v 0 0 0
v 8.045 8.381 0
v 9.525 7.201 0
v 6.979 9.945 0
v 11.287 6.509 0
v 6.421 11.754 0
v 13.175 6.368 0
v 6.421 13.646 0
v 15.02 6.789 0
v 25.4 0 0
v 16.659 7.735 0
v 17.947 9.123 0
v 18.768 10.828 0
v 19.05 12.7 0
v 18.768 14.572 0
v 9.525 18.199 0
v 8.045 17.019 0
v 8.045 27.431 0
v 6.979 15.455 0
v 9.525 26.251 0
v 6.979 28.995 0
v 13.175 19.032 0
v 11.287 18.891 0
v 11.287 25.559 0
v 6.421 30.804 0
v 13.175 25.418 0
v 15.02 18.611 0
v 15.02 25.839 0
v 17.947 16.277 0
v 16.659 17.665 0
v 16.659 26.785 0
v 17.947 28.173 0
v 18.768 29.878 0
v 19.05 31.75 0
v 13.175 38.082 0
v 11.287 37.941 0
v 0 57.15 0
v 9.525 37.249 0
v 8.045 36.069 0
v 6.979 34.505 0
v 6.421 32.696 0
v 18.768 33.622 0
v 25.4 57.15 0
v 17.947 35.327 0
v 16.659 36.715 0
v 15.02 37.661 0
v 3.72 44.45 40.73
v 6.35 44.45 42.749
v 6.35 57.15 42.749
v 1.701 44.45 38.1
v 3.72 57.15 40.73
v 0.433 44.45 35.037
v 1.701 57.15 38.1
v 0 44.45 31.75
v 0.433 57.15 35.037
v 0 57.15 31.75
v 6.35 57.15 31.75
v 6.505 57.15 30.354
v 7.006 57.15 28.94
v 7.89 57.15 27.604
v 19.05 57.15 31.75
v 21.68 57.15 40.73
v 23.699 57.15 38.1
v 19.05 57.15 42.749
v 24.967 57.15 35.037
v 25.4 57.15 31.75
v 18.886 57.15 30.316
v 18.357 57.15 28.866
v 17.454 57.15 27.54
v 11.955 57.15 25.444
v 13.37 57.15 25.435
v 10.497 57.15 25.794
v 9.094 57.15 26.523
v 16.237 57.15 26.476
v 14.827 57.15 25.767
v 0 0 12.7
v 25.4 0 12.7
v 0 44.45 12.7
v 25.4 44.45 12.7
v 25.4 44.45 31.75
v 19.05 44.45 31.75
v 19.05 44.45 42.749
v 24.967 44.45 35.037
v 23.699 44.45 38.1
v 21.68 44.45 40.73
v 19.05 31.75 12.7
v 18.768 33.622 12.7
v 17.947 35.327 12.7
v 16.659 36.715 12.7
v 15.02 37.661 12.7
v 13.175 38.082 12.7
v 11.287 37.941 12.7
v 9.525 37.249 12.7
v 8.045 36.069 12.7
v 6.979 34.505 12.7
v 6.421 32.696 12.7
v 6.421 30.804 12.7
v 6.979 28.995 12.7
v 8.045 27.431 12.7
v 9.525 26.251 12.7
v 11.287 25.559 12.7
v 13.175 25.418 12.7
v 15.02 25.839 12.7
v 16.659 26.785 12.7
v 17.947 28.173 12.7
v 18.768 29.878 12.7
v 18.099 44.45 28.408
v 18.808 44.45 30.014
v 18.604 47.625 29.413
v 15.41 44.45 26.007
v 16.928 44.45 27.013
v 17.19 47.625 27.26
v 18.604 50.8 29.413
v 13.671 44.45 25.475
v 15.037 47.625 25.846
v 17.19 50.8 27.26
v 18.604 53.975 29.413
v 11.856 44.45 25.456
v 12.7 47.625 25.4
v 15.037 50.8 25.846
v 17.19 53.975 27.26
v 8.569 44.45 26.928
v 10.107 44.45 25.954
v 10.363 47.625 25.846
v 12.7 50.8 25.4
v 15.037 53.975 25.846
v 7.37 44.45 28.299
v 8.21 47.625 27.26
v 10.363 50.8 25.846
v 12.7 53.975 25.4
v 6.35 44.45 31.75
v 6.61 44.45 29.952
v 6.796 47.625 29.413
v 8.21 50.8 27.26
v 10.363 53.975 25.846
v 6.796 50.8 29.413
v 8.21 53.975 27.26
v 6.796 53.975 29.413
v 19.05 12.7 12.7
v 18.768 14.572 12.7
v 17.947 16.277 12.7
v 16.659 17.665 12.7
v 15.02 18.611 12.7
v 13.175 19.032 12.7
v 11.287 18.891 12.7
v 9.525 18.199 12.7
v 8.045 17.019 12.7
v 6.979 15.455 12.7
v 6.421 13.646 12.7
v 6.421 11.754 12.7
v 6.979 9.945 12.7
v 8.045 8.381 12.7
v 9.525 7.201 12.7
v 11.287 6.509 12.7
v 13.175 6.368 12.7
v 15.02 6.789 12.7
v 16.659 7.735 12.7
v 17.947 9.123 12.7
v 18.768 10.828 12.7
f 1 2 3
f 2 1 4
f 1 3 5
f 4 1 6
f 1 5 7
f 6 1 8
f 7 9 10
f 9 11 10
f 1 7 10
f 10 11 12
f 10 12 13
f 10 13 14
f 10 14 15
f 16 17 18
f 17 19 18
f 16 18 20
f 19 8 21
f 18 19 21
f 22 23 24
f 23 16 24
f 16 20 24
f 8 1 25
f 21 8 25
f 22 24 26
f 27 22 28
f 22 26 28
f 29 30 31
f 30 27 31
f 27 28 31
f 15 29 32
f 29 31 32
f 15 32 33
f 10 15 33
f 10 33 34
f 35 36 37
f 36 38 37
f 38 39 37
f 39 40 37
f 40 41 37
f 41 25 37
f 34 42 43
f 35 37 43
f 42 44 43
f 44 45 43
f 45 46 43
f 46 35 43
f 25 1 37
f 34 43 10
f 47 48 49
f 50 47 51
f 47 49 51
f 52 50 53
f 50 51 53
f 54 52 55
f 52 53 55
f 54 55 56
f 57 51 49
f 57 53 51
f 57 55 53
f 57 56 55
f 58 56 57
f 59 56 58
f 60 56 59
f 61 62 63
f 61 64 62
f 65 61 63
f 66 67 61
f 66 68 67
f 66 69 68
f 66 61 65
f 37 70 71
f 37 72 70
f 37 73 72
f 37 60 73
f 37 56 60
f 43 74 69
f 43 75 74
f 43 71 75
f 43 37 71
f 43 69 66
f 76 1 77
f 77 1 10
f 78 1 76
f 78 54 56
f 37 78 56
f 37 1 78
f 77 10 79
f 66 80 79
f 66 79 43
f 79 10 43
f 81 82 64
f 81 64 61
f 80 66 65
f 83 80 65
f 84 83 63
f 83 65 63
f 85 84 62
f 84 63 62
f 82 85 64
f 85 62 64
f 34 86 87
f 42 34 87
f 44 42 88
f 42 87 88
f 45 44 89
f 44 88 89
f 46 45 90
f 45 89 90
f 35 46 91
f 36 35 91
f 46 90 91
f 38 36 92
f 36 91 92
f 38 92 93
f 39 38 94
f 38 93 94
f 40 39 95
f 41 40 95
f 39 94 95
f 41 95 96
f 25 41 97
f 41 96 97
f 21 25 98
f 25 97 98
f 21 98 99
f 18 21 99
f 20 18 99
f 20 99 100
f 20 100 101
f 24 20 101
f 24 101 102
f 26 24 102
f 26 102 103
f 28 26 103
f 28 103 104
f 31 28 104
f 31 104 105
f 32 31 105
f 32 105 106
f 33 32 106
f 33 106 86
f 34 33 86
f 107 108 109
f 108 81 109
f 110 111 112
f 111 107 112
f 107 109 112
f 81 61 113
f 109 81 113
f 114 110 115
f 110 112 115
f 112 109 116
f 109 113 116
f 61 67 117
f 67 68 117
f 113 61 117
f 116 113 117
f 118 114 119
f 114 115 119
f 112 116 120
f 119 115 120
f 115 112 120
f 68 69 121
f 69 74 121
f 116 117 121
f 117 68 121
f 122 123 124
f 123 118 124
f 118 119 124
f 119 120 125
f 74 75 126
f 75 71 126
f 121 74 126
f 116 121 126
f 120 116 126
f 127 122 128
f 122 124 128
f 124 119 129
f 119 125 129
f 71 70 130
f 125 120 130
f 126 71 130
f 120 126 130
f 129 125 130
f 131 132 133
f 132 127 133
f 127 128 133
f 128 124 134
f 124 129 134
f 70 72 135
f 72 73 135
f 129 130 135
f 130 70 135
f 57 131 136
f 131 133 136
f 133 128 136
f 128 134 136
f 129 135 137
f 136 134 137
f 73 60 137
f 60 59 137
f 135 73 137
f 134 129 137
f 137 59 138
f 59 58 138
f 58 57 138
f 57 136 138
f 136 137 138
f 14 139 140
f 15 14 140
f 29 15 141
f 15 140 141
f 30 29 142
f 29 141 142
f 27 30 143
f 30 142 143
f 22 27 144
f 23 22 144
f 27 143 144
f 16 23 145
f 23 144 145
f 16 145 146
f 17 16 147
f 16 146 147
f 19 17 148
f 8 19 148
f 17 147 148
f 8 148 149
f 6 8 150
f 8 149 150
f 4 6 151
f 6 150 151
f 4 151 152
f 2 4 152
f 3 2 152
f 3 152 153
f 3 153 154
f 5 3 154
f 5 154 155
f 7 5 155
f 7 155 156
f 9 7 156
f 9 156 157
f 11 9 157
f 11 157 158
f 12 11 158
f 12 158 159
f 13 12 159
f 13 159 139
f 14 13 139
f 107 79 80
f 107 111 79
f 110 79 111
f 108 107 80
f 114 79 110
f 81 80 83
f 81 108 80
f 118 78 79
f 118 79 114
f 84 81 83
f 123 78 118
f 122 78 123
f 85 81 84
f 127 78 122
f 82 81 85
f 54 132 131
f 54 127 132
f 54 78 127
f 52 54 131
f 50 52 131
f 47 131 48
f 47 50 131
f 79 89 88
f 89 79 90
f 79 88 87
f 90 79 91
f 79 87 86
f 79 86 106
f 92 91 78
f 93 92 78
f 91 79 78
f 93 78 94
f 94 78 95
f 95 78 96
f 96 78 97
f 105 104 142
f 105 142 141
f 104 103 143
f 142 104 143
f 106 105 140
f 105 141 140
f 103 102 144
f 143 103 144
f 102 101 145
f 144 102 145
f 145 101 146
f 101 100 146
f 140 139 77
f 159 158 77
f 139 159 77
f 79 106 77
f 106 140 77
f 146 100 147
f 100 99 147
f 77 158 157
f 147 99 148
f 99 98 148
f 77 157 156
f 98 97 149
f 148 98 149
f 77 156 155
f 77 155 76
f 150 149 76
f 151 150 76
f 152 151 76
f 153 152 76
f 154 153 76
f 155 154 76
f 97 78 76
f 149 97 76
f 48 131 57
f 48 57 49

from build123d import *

# Parameters (mm, degrees)
F0_W     = 25.4
F0_H     = 57.15
F1_DEPTH = 44.45
F2_W     = 44.45
F2_H     = 31.75
F3_DEPTH = 25.4
F5_DEPTH = 25.4
F7_DEPTH = 25.4
F8_R     = 6.35
F9_DEPTH = 25.4


with BuildPart() as f1:
    # F0 (on Top) → F1 (new body)
    with BuildSketch(Plane.XY):
        with Locations((12.7, 28.575)):
            Rectangle(F0_W, F0_H)
    extrude(amount=F1_DEPTH)

    # F2 (on face) → F3 (cut)
    with BuildSketch(Plane(origin=(0, 0, 0), x_dir=(0, -1, 0), z_dir=(-1, 0, 0))):
        with Locations((-22.225, 28.575)):
            Rectangle(F2_W, F2_H)
    extrude(amount=-F3_DEPTH, mode=Mode.SUBTRACT)

    # F4 (on face) → F5 (cut)
    with BuildSketch(Plane(origin=(0, 57.15, 0), x_dir=(-1, 0, 0), z_dir=(0, 1, 0))):
        with BuildLine():
            ThreePointArc((-25.4, 31.75), (-21.6802561211, 40.7302561211), (-12.7, 44.45))
            Line((-12.7, 44.45), (-25.4, 44.45))
            Line((-25.4, 44.45), (-25.4, 31.75))
        make_face()
        with BuildLine():
            ThreePointArc((-12.7, 44.45), (-3.7197438789, 40.7302561211), (0, 31.75))
            Line((0, 31.75), (0, 44.45))
            Line((0, 44.45), (-12.7, 44.45))
        make_face()
    extrude(amount=-F5_DEPTH, mode=Mode.SUBTRACT)

    # F6 (on face) → F7 (cut)
    with BuildSketch(Plane(origin=(0, 57.15, 0), x_dir=(-1, 0, 0), z_dir=(0, 1, 0))):
        with BuildLine():
            add(Edge.make_bspline(
                [(-6.35, 31.75), (-6.35, 38.1), (-12.7, 38.1), (-19.05, 38.1), (-19.05, 31.75)],
                knots=[0, 0, 0, 1.5707963268, 1.5707963268, 3.1415926536, 3.1415926536, 3.1415926536], degree=2, weights=[1, 0.7071067812, 1, 0.7071067812, 1]))
            Line((-6.35, 31.75), (-6.35, 42.7485226281))
            ThreePointArc((-6.35, 42.7485226281), (-12.7, 44.45), (-19.05, 42.7485226281))
            Line((-19.05, 42.7485226281), (-19.05, 31.75))
        make_face()
        with BuildLine():
            add(Edge.make_bspline(
                [(-19.05, 31.75), (-19.05, 25.4), (-12.7, 25.4), (-6.35, 25.4), (-6.35, 31.75)],
                knots=[3.1415926536, 3.1415926536, 3.1415926536, 4.7123889804, 4.7123889804, 6.2831853072, 6.2831853072, 6.2831853072], degree=2, weights=[1, 0.7071067812, 1, 0.7071067812, 1]))
            add(Edge.make_bspline(
                [(-6.35, 31.75), (-6.35, 38.1), (-12.7, 38.1), (-19.05, 38.1), (-19.05, 31.75)],
                knots=[0, 0, 0, 1.5707963268, 1.5707963268, 3.1415926536, 3.1415926536, 3.1415926536], degree=2, weights=[1, 0.7071067812, 1, 0.7071067812, 1]))
        make_face()
    extrude(amount=-F7_DEPTH, mode=Mode.SUBTRACT)

    # F8 (on face) → F9 (cut)
    with BuildSketch(Plane.XY.offset(12.7)):
        with Locations((12.7, 31.75)):
            Circle(F8_R)
        with Locations((12.7, 12.7)):
            Circle(F8_R)
    extrude(amount=-F9_DEPTH, mode=Mode.SUBTRACT)


solid = f1.part
